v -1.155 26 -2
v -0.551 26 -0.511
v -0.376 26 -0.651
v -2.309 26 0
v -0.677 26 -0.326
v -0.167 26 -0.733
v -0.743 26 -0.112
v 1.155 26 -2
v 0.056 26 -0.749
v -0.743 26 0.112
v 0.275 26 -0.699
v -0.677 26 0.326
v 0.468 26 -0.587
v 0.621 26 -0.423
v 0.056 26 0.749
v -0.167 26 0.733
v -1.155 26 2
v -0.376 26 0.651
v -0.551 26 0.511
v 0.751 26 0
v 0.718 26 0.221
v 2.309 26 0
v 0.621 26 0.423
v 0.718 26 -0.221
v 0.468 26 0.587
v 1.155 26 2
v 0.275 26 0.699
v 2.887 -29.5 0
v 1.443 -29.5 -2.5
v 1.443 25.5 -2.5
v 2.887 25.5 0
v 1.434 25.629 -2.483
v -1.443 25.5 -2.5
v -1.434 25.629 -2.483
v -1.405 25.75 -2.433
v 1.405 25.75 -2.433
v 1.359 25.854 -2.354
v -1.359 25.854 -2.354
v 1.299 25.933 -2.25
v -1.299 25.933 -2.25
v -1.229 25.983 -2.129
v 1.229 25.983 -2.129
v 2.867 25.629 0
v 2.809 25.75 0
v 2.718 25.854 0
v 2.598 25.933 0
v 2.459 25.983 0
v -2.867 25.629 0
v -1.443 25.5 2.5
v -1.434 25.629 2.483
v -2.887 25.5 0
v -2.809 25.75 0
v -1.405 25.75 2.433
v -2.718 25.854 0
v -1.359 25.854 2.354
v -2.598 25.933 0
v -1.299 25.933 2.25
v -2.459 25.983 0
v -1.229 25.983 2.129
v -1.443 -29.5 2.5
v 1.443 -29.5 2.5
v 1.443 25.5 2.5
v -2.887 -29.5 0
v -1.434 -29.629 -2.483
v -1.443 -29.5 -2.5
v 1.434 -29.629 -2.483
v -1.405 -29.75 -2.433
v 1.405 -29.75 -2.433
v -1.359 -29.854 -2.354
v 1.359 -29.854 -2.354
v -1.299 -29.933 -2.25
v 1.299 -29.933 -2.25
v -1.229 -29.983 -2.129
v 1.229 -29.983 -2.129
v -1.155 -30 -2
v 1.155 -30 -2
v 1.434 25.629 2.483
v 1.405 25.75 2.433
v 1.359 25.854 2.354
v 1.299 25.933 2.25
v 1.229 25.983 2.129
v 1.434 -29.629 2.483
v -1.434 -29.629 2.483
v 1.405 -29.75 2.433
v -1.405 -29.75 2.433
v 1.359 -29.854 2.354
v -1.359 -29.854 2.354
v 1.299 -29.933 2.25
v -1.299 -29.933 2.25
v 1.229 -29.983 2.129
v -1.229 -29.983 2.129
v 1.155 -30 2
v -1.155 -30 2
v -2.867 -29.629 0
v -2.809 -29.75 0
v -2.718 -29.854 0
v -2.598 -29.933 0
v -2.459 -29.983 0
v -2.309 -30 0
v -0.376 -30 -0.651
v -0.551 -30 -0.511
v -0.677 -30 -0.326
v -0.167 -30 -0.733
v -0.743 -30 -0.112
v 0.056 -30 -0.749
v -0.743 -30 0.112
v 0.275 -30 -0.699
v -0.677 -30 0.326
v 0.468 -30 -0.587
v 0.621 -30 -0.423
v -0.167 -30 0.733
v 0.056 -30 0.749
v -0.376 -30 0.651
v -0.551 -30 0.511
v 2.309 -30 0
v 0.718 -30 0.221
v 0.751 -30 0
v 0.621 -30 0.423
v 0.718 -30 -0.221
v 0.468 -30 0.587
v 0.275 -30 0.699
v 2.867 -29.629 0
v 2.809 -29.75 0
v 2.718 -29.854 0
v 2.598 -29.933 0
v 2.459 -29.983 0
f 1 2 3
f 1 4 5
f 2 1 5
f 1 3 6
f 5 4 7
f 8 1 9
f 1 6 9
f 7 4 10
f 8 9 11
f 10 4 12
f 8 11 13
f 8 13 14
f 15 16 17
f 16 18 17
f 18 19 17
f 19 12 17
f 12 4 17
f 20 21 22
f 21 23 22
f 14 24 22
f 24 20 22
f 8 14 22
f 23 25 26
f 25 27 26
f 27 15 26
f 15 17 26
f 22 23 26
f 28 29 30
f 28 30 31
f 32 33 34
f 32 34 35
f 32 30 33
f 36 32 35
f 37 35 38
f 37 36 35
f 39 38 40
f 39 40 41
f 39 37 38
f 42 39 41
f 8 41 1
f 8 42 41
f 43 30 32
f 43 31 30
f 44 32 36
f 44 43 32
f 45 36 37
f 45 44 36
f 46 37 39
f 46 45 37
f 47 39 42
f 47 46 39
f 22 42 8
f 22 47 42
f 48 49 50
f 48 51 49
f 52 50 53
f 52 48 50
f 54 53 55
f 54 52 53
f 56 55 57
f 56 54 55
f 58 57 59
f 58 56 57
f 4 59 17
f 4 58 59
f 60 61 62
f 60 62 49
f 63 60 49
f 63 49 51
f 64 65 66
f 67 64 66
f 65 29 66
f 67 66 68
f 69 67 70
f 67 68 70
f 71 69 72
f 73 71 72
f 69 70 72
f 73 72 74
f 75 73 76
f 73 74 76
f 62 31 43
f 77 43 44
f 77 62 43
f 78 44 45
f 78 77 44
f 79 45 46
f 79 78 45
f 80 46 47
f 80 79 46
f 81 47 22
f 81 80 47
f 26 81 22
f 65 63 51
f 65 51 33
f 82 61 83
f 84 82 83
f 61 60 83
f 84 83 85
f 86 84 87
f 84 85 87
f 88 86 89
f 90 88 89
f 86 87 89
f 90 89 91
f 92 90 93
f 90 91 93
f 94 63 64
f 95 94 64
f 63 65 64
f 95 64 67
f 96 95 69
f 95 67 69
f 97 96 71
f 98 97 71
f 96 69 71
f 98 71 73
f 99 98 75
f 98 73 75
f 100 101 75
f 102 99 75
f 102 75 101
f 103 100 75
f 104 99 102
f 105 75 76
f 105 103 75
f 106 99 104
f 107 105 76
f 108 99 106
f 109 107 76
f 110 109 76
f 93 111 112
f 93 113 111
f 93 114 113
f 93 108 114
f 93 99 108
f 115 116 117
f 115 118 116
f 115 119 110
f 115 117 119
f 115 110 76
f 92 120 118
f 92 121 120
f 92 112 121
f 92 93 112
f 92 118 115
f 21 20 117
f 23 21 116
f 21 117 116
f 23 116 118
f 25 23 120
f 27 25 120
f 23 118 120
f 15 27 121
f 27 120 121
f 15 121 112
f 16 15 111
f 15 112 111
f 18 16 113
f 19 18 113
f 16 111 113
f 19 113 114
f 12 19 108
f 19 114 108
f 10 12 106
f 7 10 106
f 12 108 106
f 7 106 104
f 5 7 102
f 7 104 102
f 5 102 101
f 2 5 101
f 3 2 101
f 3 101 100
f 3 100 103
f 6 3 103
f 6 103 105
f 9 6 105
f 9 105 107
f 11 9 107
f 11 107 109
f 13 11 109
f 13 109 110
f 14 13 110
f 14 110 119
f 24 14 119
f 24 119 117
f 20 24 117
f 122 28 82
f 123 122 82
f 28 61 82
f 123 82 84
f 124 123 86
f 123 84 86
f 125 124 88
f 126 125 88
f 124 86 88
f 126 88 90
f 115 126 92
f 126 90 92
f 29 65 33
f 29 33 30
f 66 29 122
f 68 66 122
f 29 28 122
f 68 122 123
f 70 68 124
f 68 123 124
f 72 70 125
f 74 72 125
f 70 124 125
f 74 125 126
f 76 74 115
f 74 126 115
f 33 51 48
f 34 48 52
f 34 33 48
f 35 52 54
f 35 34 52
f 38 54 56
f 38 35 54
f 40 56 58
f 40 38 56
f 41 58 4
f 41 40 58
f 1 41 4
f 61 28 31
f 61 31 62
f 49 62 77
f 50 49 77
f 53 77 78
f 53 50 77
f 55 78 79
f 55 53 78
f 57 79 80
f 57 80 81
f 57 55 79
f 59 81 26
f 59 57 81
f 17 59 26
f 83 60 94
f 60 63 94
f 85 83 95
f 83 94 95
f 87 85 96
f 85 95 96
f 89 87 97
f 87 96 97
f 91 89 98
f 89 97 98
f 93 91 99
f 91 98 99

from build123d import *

# Parameters (mm, degrees)
RESSALTO_EXTRUS_O1_DEPTH = 56
FILETE1_R                = 0.5
ESBO_O2_R                = 0.751353762
CORTE_EXTRUS_O1_DEPTH    = 57


with BuildPart() as part:
    # Esboço1 → Ressalto-extrusão1 (new body)
    with BuildSketch(Plane.XZ.offset(30)):
        Polygon((-1.443375673, -2.5), (1.443375673, -2.5), (2.886751346, 0), (1.443375673, 2.5), (-1.443375673, 2.5), (-2.886751346, 0), align=None)
    extrude(amount=-RESSALTO_EXTRUS_O1_DEPTH)

    # Filete1
    filete1_edges = [part.edges().sort_by_distance(p)[0] for p in [
        (2.165063509, 26, -1.25),
        (2.165063509, 26, 1.25),
        (0, 26, 2.5),
        (-2.165063509, 26, 1.25),
        (-2.165063509, 26, -1.25),
        (-2.165063509, -30, 1.25),
        (0, -30, 2.5),
        (2.165063509, -30, 1.25),
        (2.165063509, -30, -1.25),
        (0, -30, -2.5),
        (-2.165063509, -30, -1.25),
        (0, 26, -2.5),
    ]]
    fillet(filete1_edges, radius=FILETE1_R)

    # Esboço2 → Corte-extrusão1 (cut, through all)
    with BuildSketch(Plane.XZ.offset(30)):
        Circle(ESBO_O2_R)
    extrude(amount=-CORTE_EXTRUS_O1_DEPTH, mode=Mode.SUBTRACT)


solid = part.part
